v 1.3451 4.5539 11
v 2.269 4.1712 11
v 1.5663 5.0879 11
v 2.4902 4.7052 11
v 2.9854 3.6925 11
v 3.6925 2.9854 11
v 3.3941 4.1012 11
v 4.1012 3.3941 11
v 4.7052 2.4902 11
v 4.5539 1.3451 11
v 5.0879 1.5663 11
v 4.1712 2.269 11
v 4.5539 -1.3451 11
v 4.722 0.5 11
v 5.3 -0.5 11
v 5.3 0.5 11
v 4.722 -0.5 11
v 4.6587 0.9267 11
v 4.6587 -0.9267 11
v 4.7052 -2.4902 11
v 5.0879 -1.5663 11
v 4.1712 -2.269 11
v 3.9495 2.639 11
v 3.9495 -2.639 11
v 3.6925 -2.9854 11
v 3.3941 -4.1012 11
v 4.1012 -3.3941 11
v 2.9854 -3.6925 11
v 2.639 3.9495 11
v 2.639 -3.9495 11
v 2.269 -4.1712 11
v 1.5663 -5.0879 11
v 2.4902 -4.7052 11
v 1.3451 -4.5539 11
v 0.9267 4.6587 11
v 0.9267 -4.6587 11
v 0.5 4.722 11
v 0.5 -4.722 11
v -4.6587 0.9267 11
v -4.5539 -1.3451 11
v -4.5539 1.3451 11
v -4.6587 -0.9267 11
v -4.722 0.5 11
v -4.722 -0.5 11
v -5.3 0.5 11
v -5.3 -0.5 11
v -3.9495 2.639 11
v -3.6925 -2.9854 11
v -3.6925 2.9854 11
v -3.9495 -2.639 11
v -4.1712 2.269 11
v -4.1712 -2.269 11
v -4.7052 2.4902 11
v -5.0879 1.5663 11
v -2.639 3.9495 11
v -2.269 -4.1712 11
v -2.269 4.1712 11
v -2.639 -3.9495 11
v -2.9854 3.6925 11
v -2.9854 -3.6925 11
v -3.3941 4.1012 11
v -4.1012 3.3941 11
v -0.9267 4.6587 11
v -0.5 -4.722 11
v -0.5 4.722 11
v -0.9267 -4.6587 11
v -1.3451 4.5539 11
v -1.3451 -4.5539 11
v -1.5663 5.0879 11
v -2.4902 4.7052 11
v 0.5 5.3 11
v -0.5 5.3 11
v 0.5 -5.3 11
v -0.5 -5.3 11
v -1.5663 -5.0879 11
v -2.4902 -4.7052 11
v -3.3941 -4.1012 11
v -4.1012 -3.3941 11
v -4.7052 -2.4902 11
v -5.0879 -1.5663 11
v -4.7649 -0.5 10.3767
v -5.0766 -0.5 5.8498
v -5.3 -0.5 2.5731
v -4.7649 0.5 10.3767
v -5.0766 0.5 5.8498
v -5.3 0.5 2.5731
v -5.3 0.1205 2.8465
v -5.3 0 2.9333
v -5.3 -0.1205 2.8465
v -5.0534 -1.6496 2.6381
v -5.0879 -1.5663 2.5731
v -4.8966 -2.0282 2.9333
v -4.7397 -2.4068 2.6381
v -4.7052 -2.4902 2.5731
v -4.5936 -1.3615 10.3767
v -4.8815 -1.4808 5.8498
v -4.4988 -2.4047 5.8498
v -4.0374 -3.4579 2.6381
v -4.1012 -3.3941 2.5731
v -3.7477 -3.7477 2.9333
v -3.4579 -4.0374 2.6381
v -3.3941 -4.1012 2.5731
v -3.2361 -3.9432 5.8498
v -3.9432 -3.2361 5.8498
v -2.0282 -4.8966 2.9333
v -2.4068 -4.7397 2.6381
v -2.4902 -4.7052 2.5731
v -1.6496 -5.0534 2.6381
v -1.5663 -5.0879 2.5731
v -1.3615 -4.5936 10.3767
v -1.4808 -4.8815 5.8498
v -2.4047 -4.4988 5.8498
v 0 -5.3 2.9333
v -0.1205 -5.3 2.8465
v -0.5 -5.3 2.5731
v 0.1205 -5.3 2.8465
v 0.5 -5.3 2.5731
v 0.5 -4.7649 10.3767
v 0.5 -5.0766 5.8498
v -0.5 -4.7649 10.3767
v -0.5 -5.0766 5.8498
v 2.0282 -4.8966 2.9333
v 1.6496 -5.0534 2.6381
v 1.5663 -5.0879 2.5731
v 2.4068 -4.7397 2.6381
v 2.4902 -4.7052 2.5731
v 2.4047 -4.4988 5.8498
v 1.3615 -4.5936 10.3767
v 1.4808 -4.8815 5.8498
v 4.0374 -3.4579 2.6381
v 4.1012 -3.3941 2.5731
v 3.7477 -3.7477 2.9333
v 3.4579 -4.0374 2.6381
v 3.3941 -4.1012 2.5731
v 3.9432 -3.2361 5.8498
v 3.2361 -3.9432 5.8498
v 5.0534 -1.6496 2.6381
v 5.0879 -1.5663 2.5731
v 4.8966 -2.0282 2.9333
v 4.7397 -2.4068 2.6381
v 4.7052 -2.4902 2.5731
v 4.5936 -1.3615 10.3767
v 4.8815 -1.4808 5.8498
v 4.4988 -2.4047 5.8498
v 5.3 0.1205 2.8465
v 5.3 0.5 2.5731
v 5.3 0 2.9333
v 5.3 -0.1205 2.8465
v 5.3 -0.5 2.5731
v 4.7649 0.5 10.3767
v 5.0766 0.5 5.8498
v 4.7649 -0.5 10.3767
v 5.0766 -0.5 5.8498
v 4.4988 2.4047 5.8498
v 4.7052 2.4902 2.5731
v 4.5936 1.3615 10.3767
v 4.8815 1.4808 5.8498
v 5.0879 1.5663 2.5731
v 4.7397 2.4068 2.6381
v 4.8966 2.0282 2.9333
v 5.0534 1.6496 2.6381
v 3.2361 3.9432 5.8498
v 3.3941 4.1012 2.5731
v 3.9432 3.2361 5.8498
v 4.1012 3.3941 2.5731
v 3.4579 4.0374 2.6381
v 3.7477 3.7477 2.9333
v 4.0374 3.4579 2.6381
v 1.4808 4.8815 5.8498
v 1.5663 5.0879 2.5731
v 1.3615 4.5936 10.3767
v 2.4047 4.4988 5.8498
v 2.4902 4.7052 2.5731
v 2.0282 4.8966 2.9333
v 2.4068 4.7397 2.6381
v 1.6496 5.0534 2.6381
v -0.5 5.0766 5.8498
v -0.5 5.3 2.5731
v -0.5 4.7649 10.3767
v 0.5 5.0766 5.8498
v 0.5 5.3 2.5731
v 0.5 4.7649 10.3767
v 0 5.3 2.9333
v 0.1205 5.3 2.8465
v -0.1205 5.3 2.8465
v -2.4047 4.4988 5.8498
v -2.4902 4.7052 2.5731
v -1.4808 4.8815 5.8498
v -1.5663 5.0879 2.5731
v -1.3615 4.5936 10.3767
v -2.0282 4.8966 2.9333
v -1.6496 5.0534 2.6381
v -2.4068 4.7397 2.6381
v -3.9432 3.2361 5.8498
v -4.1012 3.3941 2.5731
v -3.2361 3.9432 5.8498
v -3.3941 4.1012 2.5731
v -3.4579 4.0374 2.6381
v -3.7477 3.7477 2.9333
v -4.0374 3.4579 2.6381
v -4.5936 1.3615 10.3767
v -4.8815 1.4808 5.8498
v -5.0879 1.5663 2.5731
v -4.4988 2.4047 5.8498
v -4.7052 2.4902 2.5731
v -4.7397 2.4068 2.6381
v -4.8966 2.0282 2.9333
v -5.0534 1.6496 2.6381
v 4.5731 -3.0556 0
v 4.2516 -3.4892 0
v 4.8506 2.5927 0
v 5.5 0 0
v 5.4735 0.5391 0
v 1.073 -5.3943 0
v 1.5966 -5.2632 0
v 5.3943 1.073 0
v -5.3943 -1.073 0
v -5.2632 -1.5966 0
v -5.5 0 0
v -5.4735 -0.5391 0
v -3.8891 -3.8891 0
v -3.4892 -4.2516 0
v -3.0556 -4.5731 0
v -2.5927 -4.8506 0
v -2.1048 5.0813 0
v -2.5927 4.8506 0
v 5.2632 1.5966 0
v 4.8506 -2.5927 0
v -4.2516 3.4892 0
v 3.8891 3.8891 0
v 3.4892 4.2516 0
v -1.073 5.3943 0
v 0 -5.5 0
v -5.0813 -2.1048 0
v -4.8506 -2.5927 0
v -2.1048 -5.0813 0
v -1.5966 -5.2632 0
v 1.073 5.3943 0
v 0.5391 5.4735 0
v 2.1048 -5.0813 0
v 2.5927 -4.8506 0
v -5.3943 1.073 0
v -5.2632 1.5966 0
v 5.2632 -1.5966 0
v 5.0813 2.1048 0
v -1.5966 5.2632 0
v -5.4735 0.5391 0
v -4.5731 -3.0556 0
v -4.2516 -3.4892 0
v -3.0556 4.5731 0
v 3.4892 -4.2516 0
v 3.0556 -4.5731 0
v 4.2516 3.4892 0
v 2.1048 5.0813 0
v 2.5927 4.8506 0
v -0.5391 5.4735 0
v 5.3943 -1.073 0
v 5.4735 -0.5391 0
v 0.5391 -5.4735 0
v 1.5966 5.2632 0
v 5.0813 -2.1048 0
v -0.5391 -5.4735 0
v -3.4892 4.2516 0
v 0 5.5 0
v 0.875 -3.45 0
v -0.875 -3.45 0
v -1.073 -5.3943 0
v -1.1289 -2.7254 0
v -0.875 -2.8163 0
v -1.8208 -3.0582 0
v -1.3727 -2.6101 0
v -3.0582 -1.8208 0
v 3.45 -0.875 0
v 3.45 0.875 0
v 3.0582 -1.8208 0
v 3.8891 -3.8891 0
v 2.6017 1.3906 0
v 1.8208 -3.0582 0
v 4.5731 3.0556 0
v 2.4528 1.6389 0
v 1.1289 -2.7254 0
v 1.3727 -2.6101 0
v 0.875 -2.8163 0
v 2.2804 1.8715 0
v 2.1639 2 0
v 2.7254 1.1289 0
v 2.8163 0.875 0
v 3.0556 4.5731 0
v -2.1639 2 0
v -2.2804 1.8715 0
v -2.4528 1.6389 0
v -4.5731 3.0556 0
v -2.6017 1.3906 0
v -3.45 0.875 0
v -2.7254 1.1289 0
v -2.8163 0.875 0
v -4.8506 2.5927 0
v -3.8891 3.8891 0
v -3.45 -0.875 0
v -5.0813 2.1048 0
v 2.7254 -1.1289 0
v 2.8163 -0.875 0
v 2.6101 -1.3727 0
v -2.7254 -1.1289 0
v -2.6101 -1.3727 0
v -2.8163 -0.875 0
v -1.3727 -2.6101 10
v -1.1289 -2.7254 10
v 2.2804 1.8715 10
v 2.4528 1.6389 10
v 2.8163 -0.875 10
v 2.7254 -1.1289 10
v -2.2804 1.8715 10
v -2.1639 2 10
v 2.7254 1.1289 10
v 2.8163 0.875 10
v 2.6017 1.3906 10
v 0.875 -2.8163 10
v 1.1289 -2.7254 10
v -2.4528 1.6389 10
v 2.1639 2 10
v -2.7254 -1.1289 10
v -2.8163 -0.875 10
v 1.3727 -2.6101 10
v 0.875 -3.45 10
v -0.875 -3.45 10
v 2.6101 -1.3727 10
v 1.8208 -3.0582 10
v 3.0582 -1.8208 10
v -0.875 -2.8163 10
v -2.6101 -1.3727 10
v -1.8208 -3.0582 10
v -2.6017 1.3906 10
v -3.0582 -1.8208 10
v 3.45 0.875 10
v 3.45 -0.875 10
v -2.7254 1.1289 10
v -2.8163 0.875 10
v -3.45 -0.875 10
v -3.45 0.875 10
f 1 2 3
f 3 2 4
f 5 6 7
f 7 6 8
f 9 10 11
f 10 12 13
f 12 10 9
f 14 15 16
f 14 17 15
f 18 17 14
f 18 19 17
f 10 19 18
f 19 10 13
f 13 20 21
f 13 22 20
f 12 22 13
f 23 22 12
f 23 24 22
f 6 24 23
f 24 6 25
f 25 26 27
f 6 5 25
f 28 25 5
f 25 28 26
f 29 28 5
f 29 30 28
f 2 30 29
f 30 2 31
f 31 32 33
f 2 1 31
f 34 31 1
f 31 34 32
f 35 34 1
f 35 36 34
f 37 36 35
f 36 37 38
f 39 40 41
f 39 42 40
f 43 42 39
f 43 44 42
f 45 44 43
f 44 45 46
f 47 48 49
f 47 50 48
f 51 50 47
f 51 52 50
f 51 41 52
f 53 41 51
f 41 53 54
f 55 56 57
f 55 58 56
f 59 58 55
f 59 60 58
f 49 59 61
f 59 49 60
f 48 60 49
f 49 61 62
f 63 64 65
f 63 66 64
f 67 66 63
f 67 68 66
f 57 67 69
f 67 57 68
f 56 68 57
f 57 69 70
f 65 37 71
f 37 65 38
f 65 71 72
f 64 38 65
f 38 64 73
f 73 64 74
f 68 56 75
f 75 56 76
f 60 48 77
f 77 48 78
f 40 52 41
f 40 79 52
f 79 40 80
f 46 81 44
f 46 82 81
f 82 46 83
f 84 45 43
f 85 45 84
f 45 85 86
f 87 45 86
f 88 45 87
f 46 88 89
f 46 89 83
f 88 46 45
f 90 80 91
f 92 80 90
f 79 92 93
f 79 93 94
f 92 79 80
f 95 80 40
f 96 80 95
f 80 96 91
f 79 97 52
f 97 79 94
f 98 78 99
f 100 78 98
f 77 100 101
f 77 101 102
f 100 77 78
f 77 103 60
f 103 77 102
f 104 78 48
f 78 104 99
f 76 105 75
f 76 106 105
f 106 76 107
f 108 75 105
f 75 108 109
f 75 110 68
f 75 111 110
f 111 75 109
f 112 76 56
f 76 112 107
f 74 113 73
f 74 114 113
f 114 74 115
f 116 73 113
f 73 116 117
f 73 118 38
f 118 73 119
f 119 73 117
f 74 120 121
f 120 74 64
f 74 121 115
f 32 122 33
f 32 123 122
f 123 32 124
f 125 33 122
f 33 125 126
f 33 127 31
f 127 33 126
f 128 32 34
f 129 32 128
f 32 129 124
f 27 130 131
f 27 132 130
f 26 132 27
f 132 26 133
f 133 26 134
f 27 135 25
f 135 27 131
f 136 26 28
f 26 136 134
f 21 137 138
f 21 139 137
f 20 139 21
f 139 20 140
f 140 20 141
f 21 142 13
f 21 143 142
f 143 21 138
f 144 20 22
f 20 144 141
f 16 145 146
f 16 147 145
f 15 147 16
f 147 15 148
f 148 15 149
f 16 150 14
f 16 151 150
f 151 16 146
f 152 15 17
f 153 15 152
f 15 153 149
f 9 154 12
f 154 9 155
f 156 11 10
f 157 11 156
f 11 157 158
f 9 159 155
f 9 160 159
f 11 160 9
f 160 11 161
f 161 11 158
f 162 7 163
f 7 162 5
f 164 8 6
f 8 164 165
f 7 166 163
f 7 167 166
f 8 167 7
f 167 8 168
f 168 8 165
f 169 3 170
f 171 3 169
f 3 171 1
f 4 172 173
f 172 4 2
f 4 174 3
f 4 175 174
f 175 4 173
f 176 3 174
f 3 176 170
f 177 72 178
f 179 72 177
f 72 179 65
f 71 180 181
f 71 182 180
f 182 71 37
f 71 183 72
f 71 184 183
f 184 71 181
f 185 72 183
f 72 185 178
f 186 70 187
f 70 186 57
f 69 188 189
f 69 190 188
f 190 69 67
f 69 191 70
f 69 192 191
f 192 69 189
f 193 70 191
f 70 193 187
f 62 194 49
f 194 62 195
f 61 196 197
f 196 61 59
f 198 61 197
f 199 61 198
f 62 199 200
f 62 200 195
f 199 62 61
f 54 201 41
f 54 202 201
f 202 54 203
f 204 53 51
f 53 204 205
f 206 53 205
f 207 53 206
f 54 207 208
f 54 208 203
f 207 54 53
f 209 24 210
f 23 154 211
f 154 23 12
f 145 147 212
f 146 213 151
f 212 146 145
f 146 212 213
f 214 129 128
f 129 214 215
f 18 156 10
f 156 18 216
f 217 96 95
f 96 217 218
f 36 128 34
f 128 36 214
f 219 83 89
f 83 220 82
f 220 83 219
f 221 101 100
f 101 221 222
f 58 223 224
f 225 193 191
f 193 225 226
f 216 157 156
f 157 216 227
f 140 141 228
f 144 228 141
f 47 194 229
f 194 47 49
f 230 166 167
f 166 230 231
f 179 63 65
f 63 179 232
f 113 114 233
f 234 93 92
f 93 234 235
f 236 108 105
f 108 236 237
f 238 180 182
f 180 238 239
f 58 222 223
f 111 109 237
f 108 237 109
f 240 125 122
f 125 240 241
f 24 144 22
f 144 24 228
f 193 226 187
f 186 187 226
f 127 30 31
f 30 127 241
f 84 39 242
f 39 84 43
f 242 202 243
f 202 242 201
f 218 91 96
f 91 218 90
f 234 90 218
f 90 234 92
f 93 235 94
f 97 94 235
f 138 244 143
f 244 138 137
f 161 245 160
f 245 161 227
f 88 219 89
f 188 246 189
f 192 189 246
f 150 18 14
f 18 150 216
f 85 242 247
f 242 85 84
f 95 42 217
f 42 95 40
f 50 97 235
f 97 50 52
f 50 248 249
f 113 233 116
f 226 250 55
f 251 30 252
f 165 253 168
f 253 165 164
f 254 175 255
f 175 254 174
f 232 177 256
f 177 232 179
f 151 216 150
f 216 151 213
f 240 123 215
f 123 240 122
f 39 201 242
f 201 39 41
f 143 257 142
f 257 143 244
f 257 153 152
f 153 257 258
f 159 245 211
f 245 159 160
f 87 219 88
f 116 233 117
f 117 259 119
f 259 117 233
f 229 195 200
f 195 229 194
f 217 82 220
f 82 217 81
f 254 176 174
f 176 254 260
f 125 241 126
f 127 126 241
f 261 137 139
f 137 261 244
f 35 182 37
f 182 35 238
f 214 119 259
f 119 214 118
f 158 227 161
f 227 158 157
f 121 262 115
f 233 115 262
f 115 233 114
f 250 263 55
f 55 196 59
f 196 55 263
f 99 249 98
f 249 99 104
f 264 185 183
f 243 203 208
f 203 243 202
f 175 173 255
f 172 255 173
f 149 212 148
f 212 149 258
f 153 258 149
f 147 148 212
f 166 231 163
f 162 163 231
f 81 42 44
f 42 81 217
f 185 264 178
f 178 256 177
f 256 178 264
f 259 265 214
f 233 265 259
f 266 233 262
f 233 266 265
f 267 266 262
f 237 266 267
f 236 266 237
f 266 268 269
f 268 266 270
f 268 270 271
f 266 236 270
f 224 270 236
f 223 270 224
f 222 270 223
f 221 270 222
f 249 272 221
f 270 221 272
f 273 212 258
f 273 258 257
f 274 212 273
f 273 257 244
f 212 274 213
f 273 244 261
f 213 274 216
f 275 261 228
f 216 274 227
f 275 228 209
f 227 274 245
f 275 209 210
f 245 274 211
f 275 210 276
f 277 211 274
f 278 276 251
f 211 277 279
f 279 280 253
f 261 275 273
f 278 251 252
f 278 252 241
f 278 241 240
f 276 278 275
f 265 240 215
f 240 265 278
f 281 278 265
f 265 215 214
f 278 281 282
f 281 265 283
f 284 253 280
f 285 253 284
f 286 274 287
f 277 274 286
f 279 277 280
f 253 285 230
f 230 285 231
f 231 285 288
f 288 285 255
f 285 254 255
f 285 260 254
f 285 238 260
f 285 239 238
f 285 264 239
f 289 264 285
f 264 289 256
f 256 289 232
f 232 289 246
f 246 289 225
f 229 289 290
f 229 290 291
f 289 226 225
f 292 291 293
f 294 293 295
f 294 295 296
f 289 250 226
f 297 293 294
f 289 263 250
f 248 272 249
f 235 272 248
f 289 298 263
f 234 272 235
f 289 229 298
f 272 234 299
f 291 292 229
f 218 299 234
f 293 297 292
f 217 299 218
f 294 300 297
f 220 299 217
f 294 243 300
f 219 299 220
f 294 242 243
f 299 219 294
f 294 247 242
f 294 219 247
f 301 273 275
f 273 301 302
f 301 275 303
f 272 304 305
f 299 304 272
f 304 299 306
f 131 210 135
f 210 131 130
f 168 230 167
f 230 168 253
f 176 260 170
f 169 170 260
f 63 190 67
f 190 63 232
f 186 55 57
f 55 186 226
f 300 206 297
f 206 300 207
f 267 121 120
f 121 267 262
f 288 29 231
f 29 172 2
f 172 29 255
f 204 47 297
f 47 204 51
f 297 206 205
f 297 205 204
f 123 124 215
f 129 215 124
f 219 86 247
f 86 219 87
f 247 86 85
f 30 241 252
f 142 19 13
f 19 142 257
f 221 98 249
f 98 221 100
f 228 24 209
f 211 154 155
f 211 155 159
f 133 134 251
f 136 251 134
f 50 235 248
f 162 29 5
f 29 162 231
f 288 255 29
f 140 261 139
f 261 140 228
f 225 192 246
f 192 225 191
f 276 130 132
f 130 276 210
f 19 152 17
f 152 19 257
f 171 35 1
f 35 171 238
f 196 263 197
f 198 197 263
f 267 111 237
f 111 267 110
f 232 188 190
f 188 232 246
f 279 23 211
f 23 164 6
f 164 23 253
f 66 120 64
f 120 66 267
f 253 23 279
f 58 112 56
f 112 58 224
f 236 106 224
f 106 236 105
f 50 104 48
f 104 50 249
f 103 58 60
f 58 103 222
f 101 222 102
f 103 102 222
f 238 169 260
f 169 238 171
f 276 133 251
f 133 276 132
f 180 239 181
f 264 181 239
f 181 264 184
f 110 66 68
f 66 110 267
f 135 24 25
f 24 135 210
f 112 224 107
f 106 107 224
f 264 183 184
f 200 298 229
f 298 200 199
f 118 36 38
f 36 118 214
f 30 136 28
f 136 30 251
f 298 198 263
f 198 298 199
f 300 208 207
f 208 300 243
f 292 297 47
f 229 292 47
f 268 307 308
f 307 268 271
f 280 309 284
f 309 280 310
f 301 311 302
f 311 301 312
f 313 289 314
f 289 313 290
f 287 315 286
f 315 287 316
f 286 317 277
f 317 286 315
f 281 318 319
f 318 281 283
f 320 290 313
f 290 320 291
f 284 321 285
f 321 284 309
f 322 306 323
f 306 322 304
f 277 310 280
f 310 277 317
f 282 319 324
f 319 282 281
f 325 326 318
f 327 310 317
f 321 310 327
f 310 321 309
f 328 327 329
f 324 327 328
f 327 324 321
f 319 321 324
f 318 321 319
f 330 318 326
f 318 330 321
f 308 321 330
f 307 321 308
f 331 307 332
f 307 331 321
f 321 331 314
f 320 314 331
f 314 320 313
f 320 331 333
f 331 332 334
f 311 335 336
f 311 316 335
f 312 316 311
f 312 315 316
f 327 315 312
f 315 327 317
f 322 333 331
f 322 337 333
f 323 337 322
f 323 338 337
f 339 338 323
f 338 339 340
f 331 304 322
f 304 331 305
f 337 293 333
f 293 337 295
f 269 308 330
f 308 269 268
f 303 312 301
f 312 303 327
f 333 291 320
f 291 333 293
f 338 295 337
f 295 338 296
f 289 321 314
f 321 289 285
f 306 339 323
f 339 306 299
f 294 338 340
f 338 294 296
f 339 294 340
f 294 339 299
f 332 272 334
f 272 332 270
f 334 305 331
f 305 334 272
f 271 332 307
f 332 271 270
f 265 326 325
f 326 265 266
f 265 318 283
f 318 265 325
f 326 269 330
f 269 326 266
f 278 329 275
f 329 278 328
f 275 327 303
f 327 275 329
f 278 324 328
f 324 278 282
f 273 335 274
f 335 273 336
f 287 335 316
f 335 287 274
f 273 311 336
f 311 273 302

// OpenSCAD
$fn = 64;


module roundRec(r_inner=6, x_block=1, y_block=1, step=22.5, h=10) {
	for (angle=[-180: step: 180])
		rotate([0, 0, angle])
			translate([r_inner, 0, 6])
				cube(size=[x_block, y_block, h], center=true);
}

module bulk() {
	roundRec(4.8, 1, 1);
	cylinder(h=11, d1=11, d2=9.5, center=false);
}


difference() {
	bulk();
	translate([0, 0, -5])
		difference() {
			cylinder(d=5.9, h=15, center=false);
			translate([0, 3 + 2, 10])
				cube(size=[6, 6, 20], center=true);
		}
	intersection() {
		translate([0, 0, -1])
			roundRec(5.9/2, x_block=1, y_block=1.75, step=45, h=11);
			translate([0, -8.7, 0])
				cube(size=[20, 20, 20], center=true);
	}
}

// roundRec();
